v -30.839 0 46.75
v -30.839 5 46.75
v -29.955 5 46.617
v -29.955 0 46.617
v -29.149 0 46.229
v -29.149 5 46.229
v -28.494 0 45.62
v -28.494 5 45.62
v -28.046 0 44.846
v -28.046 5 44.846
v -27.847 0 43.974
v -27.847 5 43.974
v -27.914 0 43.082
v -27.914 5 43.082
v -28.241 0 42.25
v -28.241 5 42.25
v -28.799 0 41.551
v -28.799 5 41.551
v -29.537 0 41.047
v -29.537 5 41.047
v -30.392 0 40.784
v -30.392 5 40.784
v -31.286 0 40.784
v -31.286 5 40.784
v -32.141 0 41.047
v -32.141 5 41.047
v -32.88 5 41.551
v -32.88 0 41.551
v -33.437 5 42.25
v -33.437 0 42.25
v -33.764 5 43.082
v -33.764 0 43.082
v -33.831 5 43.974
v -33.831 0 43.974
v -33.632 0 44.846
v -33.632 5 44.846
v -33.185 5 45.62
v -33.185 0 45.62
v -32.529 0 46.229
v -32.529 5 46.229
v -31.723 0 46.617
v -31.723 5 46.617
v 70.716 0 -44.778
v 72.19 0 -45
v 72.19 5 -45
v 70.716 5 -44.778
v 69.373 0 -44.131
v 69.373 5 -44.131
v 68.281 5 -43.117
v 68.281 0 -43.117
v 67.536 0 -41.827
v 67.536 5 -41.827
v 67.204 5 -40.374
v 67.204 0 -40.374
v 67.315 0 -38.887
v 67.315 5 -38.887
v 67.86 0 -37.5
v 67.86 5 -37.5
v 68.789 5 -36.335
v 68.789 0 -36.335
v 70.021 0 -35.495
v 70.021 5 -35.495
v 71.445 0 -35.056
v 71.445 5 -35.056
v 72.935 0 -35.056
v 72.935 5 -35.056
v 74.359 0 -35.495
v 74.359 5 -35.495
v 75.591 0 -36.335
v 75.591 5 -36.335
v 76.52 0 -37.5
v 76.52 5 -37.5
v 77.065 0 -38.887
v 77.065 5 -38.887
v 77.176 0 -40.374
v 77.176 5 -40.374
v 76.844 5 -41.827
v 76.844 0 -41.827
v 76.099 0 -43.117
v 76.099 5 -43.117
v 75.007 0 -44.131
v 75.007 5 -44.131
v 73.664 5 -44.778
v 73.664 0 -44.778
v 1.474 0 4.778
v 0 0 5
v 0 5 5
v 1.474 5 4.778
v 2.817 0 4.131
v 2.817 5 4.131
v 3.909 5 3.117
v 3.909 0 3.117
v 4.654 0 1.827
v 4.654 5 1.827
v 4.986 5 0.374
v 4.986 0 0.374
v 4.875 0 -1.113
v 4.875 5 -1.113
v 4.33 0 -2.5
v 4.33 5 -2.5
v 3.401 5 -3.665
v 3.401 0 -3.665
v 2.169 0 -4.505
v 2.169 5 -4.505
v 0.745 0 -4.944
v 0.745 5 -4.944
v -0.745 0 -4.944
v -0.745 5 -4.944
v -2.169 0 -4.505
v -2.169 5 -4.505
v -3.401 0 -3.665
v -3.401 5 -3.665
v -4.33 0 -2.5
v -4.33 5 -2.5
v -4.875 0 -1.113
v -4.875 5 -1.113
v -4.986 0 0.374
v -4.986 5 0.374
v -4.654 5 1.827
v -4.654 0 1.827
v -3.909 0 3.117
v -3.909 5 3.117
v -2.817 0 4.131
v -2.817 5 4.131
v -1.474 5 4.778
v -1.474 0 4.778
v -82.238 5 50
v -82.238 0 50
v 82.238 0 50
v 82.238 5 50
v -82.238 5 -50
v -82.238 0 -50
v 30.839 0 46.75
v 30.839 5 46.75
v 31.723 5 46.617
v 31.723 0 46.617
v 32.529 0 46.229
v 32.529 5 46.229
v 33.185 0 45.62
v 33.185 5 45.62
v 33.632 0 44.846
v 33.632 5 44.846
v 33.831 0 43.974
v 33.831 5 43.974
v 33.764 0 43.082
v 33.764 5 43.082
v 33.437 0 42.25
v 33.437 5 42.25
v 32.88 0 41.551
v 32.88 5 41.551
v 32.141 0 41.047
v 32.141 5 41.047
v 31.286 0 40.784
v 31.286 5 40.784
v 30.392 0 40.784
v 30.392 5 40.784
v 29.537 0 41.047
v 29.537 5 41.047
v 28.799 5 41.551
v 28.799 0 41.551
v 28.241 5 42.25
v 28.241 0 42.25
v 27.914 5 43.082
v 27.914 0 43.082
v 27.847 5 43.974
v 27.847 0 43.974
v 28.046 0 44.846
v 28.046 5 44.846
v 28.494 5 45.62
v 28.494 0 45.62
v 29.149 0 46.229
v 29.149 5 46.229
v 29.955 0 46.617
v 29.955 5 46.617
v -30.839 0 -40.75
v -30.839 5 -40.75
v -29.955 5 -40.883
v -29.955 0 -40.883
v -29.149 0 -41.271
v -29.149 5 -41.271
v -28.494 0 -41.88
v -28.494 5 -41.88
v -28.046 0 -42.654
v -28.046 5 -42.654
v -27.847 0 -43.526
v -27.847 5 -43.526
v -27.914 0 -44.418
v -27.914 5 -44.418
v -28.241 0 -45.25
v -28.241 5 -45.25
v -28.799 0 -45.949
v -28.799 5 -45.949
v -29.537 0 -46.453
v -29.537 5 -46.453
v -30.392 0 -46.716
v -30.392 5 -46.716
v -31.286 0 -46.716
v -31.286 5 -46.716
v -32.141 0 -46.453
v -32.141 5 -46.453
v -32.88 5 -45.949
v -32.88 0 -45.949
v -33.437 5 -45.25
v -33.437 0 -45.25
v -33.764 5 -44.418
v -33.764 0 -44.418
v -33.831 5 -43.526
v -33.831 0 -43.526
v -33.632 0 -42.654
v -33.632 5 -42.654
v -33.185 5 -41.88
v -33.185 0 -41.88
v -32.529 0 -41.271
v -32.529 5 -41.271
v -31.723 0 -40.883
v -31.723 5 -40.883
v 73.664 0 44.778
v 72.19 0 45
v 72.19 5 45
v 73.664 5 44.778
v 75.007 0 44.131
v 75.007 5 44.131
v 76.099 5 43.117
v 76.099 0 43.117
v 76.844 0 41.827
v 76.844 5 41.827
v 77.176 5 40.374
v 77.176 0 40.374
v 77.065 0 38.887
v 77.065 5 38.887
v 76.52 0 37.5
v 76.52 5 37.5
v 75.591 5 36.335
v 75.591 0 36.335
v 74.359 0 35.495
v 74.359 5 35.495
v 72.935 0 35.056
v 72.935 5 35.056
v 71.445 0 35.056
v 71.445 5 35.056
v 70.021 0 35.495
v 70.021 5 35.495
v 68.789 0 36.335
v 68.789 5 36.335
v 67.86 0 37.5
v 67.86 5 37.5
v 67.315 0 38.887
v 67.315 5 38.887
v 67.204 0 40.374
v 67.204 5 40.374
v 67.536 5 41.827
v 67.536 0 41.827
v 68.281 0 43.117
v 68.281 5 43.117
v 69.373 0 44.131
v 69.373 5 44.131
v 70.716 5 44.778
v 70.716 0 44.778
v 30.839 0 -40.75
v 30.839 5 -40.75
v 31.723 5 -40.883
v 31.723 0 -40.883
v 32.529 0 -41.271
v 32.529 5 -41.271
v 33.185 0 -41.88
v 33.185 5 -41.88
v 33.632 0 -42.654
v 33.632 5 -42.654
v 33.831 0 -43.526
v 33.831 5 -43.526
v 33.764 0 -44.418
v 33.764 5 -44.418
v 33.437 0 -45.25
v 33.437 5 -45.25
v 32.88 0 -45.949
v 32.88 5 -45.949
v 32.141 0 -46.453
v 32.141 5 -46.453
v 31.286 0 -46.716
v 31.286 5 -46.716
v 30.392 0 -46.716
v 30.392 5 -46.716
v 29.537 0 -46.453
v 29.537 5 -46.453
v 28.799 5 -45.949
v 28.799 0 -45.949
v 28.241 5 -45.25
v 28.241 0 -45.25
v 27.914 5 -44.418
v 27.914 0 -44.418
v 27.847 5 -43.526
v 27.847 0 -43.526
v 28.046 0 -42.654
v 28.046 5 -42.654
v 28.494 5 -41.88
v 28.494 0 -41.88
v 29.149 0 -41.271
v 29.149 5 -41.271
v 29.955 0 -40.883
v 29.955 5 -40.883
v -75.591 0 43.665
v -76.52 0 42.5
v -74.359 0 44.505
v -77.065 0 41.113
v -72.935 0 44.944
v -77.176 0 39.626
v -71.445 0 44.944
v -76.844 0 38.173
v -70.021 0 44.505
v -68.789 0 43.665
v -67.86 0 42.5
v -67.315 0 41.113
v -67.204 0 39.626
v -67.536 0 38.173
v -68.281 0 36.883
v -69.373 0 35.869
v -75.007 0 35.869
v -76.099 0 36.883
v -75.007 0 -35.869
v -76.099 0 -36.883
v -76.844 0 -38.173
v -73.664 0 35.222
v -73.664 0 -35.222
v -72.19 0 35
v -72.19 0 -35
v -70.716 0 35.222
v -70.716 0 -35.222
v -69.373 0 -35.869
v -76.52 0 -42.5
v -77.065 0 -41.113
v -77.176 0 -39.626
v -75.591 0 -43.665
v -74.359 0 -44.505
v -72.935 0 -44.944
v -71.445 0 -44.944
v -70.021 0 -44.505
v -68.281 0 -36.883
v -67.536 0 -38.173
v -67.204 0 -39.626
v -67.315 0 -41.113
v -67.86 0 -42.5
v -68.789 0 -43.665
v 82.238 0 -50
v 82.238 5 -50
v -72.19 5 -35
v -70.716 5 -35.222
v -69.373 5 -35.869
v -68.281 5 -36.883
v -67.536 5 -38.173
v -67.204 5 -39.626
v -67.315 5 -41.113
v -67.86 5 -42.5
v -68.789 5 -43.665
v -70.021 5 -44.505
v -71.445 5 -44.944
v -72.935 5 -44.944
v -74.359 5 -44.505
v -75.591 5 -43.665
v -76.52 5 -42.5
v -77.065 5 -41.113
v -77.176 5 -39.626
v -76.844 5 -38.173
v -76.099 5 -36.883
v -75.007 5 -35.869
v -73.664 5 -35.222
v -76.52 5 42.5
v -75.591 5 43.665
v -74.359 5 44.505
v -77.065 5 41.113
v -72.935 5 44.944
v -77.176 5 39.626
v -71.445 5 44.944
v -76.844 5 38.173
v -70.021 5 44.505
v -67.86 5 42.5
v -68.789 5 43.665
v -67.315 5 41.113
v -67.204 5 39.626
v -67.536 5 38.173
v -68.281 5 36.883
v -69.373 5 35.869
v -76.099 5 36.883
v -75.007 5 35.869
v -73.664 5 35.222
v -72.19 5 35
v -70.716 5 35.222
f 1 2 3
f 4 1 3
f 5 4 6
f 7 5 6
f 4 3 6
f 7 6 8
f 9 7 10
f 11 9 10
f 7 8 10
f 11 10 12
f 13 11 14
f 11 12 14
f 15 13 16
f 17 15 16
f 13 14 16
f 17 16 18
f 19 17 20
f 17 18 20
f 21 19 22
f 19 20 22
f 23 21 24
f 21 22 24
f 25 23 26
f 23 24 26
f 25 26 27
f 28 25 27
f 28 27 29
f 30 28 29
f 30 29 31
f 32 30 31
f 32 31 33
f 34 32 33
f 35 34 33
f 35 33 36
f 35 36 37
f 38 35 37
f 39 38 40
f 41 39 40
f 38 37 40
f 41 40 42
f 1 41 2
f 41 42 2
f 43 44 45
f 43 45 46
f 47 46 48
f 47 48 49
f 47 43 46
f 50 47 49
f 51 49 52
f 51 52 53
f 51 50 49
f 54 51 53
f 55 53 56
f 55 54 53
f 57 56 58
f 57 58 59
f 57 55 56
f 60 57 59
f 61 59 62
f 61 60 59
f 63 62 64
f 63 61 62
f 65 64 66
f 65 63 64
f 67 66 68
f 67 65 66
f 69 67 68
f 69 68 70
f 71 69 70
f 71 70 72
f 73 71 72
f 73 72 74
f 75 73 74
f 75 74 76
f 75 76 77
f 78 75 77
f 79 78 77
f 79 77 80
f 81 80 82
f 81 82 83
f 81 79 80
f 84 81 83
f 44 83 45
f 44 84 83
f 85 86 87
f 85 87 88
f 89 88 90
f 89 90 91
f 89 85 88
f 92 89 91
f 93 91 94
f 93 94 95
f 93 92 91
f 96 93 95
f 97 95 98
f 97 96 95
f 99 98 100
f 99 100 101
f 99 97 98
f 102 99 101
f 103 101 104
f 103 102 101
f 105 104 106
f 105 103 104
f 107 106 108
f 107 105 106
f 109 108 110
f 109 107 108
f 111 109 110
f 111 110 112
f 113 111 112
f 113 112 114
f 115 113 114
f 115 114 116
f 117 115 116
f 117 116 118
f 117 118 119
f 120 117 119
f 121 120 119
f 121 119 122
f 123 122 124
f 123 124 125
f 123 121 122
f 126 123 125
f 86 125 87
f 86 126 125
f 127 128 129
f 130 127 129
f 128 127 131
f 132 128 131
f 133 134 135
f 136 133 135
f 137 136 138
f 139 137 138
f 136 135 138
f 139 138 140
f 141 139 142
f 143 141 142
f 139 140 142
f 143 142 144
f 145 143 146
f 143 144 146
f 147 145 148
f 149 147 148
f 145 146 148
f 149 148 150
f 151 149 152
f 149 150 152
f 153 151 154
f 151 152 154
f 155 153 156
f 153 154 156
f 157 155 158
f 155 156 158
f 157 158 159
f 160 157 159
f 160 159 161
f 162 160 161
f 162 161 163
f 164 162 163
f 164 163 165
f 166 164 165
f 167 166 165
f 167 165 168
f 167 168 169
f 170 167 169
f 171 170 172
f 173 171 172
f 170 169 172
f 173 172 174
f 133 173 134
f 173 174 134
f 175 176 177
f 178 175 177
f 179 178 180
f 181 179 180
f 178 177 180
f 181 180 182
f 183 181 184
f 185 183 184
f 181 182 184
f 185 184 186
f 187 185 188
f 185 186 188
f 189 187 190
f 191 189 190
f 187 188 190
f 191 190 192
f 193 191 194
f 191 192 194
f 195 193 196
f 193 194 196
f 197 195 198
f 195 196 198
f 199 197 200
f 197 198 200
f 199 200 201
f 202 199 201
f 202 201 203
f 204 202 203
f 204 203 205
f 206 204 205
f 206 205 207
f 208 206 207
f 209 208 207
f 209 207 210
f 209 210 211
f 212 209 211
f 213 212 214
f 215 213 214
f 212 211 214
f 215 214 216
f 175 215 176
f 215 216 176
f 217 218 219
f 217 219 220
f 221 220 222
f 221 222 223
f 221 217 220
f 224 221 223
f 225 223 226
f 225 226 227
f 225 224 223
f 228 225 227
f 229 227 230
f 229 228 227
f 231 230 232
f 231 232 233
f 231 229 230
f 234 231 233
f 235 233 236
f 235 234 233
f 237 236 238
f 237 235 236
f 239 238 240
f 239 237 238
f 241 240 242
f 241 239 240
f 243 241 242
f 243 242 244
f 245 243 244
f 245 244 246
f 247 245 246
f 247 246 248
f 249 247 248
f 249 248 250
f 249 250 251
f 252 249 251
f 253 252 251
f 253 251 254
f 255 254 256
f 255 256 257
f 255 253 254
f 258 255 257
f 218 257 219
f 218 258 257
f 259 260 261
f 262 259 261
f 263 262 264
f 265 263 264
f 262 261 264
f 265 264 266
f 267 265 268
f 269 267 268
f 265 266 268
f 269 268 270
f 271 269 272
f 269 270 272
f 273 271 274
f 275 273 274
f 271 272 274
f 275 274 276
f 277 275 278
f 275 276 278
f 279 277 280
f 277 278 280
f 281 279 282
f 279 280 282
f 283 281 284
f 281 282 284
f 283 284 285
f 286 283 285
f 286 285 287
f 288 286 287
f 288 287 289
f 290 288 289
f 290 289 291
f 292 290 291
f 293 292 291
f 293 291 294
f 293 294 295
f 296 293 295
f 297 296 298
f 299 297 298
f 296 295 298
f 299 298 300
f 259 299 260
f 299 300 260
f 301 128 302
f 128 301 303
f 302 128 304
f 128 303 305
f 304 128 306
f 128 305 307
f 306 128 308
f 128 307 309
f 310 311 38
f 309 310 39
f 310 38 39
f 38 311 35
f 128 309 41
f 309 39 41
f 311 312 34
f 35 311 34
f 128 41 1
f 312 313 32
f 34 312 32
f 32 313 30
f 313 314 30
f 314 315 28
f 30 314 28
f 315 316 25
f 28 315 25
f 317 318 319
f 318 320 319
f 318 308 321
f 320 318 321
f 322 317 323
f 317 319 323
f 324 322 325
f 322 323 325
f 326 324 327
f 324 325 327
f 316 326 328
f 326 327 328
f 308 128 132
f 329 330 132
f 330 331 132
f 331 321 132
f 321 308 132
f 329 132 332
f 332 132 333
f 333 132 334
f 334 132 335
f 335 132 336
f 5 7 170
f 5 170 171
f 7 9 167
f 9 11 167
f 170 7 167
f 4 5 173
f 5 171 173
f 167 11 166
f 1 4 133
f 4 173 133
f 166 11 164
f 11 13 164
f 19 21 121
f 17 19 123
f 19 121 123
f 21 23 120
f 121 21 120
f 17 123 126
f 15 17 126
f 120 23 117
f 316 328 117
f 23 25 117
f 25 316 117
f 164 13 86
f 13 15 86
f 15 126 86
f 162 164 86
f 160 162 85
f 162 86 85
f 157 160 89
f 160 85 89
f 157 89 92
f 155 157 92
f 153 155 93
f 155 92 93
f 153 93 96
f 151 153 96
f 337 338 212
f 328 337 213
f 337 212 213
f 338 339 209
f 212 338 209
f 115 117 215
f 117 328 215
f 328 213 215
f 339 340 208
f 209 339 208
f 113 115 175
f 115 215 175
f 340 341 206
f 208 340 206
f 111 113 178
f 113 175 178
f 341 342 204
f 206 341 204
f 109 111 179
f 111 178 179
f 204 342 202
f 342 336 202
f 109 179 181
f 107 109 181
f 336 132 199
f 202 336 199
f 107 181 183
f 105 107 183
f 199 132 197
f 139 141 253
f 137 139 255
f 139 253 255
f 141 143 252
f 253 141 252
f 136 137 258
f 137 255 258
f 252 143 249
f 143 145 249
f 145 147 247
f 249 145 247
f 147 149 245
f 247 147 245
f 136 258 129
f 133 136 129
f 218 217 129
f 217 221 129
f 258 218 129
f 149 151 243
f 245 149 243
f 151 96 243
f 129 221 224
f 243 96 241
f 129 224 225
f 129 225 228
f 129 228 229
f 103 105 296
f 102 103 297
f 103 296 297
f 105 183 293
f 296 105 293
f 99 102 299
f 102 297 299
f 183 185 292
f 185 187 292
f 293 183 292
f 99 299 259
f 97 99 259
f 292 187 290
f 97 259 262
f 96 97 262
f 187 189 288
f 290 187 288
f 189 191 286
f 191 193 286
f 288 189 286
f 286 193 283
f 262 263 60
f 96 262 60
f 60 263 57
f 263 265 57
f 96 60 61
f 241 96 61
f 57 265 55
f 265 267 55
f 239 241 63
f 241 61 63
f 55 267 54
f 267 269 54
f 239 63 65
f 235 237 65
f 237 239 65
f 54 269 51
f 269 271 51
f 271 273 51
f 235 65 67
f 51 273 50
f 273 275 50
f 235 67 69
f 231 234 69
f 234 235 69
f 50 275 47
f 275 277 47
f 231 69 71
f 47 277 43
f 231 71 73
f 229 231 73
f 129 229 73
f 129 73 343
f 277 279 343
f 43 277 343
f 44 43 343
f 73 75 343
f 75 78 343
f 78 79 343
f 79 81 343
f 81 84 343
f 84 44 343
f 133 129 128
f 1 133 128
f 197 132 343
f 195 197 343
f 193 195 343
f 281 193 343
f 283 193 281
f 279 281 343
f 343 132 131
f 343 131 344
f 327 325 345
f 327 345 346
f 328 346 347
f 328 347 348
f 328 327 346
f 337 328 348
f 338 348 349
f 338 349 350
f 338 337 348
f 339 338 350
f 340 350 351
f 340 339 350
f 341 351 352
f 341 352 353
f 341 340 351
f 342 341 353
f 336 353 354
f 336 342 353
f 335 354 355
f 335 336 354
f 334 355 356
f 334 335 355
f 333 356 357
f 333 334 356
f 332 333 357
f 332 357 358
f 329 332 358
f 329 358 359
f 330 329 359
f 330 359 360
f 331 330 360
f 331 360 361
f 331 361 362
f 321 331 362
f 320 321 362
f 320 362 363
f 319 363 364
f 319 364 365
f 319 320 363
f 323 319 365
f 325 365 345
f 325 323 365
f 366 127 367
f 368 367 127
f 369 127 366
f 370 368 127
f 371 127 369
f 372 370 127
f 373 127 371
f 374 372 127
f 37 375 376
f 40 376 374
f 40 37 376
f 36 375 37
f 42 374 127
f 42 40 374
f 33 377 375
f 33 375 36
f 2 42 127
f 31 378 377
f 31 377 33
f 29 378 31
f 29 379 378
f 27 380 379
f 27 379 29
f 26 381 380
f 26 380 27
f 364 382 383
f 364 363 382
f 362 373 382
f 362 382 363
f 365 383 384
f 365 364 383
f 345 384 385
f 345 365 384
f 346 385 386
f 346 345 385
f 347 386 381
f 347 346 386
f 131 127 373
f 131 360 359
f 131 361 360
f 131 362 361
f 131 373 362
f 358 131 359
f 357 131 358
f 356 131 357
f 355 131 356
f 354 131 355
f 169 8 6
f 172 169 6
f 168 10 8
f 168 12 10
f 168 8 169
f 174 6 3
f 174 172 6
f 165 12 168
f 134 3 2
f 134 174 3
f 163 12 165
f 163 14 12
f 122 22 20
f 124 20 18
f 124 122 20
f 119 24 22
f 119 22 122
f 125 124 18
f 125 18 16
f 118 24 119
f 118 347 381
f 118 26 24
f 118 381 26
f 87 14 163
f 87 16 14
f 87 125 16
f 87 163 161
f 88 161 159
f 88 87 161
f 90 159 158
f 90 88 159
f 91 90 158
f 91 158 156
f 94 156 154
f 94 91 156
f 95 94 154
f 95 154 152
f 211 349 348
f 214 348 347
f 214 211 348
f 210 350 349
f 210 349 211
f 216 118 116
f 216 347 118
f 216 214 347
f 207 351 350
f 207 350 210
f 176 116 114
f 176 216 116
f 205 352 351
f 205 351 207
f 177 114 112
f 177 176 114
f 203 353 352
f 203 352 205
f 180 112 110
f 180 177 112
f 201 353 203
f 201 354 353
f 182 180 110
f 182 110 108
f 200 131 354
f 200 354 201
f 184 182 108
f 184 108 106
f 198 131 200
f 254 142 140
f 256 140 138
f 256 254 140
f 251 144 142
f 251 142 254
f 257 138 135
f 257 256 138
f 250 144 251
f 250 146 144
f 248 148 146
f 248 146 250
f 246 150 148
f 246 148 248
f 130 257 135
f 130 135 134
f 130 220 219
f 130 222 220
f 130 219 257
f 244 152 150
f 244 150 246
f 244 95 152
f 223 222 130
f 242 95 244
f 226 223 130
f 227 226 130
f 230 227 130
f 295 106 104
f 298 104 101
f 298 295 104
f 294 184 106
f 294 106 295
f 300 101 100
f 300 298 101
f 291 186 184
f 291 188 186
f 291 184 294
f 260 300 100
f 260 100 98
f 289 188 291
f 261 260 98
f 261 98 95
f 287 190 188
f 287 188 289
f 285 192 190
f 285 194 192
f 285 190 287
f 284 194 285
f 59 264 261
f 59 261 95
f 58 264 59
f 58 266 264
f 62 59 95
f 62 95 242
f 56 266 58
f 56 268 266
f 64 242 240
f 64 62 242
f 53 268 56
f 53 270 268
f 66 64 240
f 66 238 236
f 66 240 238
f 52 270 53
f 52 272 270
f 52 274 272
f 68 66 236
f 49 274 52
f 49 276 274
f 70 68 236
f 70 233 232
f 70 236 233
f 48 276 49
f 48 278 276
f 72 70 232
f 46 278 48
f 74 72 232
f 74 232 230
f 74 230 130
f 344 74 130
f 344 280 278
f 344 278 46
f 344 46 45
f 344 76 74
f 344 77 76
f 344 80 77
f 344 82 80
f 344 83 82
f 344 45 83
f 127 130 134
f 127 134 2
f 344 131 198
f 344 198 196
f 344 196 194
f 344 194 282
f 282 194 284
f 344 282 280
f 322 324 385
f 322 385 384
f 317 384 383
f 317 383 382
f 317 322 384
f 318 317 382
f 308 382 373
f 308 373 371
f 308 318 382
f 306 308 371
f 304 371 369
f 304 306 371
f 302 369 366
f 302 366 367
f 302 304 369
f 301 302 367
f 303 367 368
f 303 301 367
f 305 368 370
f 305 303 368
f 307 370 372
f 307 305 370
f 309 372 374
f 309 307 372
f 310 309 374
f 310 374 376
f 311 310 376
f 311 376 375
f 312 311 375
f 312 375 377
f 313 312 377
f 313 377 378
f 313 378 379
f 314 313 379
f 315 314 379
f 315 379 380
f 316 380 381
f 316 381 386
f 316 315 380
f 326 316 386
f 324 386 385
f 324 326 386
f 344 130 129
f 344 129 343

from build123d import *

# Parameters (mm, degrees)
ESQUISSE1_W             = 180.475
ESQUISSE1_H             = 100
ESQUISSE1_R             = 5
BOSS_EXTRU_1_DEPTH      = 5
ESQUISSE2_W             = 8
ESQUISSE2_H             = 100
ENL_V_MAT_EXTRU_1_DEPTH = 5
ESQUISSE3_R             = 3
ENL_V_MAT_EXTRU_2_DEPTH = 5


with BuildPart() as part:
    # Esquisse1 → Boss.-Extru.1 (new body)
    with BuildSketch(Plane(origin=(0, 0, 0), x_dir=(1, 0, 0), z_dir=(0, 1, 0))):
        Rectangle(ESQUISSE1_W, ESQUISSE1_H)
        with Locations(Location((-72.19, 40, 0), (0, 0, 270))):
            Circle(ESQUISSE1_R, mode=Mode.SUBTRACT)
        with Locations(Location((72.19, 40, 0), (0, 0, 90))):
            Circle(ESQUISSE1_R, mode=Mode.SUBTRACT)
        with Locations(Location((72.19, -40, 0), (0, 0, 270))):
            Circle(ESQUISSE1_R, mode=Mode.SUBTRACT)
        with Locations(Location((-72.19, -40, 0), (0, 0, 90))):
            Circle(ESQUISSE1_R, mode=Mode.SUBTRACT)
        with Locations(Location((0, 0, 0), (0, 0, 270))):
            Circle(ESQUISSE1_R, mode=Mode.SUBTRACT)
    extrude(amount=BOSS_EXTRU_1_DEPTH)

    # Esquisse2 → Enlèv. mat.-Extru.1 (cut)
    with BuildSketch(Plane(origin=(0, 5, 0), x_dir=(1, 0, 0), z_dir=(0, 1, 0))):
        with Locations((-86.2375, 0)):
            Rectangle(ESQUISSE2_W, ESQUISSE2_H)
        with Locations((86.2375, 0)):
            Rectangle(ESQUISSE2_W, ESQUISSE2_H)
    extrude(amount=-ENL_V_MAT_EXTRU_1_DEPTH, mode=Mode.SUBTRACT)

    # Esquisse3 → Enlèv. mat.-Extru.2 (cut)
    with BuildSketch(Plane(origin=(0, 5, 0), x_dir=(1, 0, 0), z_dir=(0, 1, 0))):
        with Locations(Location((-30.8390625, 43.75, 0), (0, 0, 270))):
            Circle(ESQUISSE3_R)
        with Locations(Location((30.8390625, 43.75, 0), (0, 0, 270))):
            Circle(ESQUISSE3_R)
        with Locations(Location((30.8390625, -43.75, 0), (0, 0, 270))):
            Circle(ESQUISSE3_R)
        with Locations(Location((-30.8390625, -43.75, 0), (0, 0, 270))):
            Circle(ESQUISSE3_R)
    extrude(amount=-ENL_V_MAT_EXTRU_2_DEPTH, mode=Mode.SUBTRACT)


solid = part.part
